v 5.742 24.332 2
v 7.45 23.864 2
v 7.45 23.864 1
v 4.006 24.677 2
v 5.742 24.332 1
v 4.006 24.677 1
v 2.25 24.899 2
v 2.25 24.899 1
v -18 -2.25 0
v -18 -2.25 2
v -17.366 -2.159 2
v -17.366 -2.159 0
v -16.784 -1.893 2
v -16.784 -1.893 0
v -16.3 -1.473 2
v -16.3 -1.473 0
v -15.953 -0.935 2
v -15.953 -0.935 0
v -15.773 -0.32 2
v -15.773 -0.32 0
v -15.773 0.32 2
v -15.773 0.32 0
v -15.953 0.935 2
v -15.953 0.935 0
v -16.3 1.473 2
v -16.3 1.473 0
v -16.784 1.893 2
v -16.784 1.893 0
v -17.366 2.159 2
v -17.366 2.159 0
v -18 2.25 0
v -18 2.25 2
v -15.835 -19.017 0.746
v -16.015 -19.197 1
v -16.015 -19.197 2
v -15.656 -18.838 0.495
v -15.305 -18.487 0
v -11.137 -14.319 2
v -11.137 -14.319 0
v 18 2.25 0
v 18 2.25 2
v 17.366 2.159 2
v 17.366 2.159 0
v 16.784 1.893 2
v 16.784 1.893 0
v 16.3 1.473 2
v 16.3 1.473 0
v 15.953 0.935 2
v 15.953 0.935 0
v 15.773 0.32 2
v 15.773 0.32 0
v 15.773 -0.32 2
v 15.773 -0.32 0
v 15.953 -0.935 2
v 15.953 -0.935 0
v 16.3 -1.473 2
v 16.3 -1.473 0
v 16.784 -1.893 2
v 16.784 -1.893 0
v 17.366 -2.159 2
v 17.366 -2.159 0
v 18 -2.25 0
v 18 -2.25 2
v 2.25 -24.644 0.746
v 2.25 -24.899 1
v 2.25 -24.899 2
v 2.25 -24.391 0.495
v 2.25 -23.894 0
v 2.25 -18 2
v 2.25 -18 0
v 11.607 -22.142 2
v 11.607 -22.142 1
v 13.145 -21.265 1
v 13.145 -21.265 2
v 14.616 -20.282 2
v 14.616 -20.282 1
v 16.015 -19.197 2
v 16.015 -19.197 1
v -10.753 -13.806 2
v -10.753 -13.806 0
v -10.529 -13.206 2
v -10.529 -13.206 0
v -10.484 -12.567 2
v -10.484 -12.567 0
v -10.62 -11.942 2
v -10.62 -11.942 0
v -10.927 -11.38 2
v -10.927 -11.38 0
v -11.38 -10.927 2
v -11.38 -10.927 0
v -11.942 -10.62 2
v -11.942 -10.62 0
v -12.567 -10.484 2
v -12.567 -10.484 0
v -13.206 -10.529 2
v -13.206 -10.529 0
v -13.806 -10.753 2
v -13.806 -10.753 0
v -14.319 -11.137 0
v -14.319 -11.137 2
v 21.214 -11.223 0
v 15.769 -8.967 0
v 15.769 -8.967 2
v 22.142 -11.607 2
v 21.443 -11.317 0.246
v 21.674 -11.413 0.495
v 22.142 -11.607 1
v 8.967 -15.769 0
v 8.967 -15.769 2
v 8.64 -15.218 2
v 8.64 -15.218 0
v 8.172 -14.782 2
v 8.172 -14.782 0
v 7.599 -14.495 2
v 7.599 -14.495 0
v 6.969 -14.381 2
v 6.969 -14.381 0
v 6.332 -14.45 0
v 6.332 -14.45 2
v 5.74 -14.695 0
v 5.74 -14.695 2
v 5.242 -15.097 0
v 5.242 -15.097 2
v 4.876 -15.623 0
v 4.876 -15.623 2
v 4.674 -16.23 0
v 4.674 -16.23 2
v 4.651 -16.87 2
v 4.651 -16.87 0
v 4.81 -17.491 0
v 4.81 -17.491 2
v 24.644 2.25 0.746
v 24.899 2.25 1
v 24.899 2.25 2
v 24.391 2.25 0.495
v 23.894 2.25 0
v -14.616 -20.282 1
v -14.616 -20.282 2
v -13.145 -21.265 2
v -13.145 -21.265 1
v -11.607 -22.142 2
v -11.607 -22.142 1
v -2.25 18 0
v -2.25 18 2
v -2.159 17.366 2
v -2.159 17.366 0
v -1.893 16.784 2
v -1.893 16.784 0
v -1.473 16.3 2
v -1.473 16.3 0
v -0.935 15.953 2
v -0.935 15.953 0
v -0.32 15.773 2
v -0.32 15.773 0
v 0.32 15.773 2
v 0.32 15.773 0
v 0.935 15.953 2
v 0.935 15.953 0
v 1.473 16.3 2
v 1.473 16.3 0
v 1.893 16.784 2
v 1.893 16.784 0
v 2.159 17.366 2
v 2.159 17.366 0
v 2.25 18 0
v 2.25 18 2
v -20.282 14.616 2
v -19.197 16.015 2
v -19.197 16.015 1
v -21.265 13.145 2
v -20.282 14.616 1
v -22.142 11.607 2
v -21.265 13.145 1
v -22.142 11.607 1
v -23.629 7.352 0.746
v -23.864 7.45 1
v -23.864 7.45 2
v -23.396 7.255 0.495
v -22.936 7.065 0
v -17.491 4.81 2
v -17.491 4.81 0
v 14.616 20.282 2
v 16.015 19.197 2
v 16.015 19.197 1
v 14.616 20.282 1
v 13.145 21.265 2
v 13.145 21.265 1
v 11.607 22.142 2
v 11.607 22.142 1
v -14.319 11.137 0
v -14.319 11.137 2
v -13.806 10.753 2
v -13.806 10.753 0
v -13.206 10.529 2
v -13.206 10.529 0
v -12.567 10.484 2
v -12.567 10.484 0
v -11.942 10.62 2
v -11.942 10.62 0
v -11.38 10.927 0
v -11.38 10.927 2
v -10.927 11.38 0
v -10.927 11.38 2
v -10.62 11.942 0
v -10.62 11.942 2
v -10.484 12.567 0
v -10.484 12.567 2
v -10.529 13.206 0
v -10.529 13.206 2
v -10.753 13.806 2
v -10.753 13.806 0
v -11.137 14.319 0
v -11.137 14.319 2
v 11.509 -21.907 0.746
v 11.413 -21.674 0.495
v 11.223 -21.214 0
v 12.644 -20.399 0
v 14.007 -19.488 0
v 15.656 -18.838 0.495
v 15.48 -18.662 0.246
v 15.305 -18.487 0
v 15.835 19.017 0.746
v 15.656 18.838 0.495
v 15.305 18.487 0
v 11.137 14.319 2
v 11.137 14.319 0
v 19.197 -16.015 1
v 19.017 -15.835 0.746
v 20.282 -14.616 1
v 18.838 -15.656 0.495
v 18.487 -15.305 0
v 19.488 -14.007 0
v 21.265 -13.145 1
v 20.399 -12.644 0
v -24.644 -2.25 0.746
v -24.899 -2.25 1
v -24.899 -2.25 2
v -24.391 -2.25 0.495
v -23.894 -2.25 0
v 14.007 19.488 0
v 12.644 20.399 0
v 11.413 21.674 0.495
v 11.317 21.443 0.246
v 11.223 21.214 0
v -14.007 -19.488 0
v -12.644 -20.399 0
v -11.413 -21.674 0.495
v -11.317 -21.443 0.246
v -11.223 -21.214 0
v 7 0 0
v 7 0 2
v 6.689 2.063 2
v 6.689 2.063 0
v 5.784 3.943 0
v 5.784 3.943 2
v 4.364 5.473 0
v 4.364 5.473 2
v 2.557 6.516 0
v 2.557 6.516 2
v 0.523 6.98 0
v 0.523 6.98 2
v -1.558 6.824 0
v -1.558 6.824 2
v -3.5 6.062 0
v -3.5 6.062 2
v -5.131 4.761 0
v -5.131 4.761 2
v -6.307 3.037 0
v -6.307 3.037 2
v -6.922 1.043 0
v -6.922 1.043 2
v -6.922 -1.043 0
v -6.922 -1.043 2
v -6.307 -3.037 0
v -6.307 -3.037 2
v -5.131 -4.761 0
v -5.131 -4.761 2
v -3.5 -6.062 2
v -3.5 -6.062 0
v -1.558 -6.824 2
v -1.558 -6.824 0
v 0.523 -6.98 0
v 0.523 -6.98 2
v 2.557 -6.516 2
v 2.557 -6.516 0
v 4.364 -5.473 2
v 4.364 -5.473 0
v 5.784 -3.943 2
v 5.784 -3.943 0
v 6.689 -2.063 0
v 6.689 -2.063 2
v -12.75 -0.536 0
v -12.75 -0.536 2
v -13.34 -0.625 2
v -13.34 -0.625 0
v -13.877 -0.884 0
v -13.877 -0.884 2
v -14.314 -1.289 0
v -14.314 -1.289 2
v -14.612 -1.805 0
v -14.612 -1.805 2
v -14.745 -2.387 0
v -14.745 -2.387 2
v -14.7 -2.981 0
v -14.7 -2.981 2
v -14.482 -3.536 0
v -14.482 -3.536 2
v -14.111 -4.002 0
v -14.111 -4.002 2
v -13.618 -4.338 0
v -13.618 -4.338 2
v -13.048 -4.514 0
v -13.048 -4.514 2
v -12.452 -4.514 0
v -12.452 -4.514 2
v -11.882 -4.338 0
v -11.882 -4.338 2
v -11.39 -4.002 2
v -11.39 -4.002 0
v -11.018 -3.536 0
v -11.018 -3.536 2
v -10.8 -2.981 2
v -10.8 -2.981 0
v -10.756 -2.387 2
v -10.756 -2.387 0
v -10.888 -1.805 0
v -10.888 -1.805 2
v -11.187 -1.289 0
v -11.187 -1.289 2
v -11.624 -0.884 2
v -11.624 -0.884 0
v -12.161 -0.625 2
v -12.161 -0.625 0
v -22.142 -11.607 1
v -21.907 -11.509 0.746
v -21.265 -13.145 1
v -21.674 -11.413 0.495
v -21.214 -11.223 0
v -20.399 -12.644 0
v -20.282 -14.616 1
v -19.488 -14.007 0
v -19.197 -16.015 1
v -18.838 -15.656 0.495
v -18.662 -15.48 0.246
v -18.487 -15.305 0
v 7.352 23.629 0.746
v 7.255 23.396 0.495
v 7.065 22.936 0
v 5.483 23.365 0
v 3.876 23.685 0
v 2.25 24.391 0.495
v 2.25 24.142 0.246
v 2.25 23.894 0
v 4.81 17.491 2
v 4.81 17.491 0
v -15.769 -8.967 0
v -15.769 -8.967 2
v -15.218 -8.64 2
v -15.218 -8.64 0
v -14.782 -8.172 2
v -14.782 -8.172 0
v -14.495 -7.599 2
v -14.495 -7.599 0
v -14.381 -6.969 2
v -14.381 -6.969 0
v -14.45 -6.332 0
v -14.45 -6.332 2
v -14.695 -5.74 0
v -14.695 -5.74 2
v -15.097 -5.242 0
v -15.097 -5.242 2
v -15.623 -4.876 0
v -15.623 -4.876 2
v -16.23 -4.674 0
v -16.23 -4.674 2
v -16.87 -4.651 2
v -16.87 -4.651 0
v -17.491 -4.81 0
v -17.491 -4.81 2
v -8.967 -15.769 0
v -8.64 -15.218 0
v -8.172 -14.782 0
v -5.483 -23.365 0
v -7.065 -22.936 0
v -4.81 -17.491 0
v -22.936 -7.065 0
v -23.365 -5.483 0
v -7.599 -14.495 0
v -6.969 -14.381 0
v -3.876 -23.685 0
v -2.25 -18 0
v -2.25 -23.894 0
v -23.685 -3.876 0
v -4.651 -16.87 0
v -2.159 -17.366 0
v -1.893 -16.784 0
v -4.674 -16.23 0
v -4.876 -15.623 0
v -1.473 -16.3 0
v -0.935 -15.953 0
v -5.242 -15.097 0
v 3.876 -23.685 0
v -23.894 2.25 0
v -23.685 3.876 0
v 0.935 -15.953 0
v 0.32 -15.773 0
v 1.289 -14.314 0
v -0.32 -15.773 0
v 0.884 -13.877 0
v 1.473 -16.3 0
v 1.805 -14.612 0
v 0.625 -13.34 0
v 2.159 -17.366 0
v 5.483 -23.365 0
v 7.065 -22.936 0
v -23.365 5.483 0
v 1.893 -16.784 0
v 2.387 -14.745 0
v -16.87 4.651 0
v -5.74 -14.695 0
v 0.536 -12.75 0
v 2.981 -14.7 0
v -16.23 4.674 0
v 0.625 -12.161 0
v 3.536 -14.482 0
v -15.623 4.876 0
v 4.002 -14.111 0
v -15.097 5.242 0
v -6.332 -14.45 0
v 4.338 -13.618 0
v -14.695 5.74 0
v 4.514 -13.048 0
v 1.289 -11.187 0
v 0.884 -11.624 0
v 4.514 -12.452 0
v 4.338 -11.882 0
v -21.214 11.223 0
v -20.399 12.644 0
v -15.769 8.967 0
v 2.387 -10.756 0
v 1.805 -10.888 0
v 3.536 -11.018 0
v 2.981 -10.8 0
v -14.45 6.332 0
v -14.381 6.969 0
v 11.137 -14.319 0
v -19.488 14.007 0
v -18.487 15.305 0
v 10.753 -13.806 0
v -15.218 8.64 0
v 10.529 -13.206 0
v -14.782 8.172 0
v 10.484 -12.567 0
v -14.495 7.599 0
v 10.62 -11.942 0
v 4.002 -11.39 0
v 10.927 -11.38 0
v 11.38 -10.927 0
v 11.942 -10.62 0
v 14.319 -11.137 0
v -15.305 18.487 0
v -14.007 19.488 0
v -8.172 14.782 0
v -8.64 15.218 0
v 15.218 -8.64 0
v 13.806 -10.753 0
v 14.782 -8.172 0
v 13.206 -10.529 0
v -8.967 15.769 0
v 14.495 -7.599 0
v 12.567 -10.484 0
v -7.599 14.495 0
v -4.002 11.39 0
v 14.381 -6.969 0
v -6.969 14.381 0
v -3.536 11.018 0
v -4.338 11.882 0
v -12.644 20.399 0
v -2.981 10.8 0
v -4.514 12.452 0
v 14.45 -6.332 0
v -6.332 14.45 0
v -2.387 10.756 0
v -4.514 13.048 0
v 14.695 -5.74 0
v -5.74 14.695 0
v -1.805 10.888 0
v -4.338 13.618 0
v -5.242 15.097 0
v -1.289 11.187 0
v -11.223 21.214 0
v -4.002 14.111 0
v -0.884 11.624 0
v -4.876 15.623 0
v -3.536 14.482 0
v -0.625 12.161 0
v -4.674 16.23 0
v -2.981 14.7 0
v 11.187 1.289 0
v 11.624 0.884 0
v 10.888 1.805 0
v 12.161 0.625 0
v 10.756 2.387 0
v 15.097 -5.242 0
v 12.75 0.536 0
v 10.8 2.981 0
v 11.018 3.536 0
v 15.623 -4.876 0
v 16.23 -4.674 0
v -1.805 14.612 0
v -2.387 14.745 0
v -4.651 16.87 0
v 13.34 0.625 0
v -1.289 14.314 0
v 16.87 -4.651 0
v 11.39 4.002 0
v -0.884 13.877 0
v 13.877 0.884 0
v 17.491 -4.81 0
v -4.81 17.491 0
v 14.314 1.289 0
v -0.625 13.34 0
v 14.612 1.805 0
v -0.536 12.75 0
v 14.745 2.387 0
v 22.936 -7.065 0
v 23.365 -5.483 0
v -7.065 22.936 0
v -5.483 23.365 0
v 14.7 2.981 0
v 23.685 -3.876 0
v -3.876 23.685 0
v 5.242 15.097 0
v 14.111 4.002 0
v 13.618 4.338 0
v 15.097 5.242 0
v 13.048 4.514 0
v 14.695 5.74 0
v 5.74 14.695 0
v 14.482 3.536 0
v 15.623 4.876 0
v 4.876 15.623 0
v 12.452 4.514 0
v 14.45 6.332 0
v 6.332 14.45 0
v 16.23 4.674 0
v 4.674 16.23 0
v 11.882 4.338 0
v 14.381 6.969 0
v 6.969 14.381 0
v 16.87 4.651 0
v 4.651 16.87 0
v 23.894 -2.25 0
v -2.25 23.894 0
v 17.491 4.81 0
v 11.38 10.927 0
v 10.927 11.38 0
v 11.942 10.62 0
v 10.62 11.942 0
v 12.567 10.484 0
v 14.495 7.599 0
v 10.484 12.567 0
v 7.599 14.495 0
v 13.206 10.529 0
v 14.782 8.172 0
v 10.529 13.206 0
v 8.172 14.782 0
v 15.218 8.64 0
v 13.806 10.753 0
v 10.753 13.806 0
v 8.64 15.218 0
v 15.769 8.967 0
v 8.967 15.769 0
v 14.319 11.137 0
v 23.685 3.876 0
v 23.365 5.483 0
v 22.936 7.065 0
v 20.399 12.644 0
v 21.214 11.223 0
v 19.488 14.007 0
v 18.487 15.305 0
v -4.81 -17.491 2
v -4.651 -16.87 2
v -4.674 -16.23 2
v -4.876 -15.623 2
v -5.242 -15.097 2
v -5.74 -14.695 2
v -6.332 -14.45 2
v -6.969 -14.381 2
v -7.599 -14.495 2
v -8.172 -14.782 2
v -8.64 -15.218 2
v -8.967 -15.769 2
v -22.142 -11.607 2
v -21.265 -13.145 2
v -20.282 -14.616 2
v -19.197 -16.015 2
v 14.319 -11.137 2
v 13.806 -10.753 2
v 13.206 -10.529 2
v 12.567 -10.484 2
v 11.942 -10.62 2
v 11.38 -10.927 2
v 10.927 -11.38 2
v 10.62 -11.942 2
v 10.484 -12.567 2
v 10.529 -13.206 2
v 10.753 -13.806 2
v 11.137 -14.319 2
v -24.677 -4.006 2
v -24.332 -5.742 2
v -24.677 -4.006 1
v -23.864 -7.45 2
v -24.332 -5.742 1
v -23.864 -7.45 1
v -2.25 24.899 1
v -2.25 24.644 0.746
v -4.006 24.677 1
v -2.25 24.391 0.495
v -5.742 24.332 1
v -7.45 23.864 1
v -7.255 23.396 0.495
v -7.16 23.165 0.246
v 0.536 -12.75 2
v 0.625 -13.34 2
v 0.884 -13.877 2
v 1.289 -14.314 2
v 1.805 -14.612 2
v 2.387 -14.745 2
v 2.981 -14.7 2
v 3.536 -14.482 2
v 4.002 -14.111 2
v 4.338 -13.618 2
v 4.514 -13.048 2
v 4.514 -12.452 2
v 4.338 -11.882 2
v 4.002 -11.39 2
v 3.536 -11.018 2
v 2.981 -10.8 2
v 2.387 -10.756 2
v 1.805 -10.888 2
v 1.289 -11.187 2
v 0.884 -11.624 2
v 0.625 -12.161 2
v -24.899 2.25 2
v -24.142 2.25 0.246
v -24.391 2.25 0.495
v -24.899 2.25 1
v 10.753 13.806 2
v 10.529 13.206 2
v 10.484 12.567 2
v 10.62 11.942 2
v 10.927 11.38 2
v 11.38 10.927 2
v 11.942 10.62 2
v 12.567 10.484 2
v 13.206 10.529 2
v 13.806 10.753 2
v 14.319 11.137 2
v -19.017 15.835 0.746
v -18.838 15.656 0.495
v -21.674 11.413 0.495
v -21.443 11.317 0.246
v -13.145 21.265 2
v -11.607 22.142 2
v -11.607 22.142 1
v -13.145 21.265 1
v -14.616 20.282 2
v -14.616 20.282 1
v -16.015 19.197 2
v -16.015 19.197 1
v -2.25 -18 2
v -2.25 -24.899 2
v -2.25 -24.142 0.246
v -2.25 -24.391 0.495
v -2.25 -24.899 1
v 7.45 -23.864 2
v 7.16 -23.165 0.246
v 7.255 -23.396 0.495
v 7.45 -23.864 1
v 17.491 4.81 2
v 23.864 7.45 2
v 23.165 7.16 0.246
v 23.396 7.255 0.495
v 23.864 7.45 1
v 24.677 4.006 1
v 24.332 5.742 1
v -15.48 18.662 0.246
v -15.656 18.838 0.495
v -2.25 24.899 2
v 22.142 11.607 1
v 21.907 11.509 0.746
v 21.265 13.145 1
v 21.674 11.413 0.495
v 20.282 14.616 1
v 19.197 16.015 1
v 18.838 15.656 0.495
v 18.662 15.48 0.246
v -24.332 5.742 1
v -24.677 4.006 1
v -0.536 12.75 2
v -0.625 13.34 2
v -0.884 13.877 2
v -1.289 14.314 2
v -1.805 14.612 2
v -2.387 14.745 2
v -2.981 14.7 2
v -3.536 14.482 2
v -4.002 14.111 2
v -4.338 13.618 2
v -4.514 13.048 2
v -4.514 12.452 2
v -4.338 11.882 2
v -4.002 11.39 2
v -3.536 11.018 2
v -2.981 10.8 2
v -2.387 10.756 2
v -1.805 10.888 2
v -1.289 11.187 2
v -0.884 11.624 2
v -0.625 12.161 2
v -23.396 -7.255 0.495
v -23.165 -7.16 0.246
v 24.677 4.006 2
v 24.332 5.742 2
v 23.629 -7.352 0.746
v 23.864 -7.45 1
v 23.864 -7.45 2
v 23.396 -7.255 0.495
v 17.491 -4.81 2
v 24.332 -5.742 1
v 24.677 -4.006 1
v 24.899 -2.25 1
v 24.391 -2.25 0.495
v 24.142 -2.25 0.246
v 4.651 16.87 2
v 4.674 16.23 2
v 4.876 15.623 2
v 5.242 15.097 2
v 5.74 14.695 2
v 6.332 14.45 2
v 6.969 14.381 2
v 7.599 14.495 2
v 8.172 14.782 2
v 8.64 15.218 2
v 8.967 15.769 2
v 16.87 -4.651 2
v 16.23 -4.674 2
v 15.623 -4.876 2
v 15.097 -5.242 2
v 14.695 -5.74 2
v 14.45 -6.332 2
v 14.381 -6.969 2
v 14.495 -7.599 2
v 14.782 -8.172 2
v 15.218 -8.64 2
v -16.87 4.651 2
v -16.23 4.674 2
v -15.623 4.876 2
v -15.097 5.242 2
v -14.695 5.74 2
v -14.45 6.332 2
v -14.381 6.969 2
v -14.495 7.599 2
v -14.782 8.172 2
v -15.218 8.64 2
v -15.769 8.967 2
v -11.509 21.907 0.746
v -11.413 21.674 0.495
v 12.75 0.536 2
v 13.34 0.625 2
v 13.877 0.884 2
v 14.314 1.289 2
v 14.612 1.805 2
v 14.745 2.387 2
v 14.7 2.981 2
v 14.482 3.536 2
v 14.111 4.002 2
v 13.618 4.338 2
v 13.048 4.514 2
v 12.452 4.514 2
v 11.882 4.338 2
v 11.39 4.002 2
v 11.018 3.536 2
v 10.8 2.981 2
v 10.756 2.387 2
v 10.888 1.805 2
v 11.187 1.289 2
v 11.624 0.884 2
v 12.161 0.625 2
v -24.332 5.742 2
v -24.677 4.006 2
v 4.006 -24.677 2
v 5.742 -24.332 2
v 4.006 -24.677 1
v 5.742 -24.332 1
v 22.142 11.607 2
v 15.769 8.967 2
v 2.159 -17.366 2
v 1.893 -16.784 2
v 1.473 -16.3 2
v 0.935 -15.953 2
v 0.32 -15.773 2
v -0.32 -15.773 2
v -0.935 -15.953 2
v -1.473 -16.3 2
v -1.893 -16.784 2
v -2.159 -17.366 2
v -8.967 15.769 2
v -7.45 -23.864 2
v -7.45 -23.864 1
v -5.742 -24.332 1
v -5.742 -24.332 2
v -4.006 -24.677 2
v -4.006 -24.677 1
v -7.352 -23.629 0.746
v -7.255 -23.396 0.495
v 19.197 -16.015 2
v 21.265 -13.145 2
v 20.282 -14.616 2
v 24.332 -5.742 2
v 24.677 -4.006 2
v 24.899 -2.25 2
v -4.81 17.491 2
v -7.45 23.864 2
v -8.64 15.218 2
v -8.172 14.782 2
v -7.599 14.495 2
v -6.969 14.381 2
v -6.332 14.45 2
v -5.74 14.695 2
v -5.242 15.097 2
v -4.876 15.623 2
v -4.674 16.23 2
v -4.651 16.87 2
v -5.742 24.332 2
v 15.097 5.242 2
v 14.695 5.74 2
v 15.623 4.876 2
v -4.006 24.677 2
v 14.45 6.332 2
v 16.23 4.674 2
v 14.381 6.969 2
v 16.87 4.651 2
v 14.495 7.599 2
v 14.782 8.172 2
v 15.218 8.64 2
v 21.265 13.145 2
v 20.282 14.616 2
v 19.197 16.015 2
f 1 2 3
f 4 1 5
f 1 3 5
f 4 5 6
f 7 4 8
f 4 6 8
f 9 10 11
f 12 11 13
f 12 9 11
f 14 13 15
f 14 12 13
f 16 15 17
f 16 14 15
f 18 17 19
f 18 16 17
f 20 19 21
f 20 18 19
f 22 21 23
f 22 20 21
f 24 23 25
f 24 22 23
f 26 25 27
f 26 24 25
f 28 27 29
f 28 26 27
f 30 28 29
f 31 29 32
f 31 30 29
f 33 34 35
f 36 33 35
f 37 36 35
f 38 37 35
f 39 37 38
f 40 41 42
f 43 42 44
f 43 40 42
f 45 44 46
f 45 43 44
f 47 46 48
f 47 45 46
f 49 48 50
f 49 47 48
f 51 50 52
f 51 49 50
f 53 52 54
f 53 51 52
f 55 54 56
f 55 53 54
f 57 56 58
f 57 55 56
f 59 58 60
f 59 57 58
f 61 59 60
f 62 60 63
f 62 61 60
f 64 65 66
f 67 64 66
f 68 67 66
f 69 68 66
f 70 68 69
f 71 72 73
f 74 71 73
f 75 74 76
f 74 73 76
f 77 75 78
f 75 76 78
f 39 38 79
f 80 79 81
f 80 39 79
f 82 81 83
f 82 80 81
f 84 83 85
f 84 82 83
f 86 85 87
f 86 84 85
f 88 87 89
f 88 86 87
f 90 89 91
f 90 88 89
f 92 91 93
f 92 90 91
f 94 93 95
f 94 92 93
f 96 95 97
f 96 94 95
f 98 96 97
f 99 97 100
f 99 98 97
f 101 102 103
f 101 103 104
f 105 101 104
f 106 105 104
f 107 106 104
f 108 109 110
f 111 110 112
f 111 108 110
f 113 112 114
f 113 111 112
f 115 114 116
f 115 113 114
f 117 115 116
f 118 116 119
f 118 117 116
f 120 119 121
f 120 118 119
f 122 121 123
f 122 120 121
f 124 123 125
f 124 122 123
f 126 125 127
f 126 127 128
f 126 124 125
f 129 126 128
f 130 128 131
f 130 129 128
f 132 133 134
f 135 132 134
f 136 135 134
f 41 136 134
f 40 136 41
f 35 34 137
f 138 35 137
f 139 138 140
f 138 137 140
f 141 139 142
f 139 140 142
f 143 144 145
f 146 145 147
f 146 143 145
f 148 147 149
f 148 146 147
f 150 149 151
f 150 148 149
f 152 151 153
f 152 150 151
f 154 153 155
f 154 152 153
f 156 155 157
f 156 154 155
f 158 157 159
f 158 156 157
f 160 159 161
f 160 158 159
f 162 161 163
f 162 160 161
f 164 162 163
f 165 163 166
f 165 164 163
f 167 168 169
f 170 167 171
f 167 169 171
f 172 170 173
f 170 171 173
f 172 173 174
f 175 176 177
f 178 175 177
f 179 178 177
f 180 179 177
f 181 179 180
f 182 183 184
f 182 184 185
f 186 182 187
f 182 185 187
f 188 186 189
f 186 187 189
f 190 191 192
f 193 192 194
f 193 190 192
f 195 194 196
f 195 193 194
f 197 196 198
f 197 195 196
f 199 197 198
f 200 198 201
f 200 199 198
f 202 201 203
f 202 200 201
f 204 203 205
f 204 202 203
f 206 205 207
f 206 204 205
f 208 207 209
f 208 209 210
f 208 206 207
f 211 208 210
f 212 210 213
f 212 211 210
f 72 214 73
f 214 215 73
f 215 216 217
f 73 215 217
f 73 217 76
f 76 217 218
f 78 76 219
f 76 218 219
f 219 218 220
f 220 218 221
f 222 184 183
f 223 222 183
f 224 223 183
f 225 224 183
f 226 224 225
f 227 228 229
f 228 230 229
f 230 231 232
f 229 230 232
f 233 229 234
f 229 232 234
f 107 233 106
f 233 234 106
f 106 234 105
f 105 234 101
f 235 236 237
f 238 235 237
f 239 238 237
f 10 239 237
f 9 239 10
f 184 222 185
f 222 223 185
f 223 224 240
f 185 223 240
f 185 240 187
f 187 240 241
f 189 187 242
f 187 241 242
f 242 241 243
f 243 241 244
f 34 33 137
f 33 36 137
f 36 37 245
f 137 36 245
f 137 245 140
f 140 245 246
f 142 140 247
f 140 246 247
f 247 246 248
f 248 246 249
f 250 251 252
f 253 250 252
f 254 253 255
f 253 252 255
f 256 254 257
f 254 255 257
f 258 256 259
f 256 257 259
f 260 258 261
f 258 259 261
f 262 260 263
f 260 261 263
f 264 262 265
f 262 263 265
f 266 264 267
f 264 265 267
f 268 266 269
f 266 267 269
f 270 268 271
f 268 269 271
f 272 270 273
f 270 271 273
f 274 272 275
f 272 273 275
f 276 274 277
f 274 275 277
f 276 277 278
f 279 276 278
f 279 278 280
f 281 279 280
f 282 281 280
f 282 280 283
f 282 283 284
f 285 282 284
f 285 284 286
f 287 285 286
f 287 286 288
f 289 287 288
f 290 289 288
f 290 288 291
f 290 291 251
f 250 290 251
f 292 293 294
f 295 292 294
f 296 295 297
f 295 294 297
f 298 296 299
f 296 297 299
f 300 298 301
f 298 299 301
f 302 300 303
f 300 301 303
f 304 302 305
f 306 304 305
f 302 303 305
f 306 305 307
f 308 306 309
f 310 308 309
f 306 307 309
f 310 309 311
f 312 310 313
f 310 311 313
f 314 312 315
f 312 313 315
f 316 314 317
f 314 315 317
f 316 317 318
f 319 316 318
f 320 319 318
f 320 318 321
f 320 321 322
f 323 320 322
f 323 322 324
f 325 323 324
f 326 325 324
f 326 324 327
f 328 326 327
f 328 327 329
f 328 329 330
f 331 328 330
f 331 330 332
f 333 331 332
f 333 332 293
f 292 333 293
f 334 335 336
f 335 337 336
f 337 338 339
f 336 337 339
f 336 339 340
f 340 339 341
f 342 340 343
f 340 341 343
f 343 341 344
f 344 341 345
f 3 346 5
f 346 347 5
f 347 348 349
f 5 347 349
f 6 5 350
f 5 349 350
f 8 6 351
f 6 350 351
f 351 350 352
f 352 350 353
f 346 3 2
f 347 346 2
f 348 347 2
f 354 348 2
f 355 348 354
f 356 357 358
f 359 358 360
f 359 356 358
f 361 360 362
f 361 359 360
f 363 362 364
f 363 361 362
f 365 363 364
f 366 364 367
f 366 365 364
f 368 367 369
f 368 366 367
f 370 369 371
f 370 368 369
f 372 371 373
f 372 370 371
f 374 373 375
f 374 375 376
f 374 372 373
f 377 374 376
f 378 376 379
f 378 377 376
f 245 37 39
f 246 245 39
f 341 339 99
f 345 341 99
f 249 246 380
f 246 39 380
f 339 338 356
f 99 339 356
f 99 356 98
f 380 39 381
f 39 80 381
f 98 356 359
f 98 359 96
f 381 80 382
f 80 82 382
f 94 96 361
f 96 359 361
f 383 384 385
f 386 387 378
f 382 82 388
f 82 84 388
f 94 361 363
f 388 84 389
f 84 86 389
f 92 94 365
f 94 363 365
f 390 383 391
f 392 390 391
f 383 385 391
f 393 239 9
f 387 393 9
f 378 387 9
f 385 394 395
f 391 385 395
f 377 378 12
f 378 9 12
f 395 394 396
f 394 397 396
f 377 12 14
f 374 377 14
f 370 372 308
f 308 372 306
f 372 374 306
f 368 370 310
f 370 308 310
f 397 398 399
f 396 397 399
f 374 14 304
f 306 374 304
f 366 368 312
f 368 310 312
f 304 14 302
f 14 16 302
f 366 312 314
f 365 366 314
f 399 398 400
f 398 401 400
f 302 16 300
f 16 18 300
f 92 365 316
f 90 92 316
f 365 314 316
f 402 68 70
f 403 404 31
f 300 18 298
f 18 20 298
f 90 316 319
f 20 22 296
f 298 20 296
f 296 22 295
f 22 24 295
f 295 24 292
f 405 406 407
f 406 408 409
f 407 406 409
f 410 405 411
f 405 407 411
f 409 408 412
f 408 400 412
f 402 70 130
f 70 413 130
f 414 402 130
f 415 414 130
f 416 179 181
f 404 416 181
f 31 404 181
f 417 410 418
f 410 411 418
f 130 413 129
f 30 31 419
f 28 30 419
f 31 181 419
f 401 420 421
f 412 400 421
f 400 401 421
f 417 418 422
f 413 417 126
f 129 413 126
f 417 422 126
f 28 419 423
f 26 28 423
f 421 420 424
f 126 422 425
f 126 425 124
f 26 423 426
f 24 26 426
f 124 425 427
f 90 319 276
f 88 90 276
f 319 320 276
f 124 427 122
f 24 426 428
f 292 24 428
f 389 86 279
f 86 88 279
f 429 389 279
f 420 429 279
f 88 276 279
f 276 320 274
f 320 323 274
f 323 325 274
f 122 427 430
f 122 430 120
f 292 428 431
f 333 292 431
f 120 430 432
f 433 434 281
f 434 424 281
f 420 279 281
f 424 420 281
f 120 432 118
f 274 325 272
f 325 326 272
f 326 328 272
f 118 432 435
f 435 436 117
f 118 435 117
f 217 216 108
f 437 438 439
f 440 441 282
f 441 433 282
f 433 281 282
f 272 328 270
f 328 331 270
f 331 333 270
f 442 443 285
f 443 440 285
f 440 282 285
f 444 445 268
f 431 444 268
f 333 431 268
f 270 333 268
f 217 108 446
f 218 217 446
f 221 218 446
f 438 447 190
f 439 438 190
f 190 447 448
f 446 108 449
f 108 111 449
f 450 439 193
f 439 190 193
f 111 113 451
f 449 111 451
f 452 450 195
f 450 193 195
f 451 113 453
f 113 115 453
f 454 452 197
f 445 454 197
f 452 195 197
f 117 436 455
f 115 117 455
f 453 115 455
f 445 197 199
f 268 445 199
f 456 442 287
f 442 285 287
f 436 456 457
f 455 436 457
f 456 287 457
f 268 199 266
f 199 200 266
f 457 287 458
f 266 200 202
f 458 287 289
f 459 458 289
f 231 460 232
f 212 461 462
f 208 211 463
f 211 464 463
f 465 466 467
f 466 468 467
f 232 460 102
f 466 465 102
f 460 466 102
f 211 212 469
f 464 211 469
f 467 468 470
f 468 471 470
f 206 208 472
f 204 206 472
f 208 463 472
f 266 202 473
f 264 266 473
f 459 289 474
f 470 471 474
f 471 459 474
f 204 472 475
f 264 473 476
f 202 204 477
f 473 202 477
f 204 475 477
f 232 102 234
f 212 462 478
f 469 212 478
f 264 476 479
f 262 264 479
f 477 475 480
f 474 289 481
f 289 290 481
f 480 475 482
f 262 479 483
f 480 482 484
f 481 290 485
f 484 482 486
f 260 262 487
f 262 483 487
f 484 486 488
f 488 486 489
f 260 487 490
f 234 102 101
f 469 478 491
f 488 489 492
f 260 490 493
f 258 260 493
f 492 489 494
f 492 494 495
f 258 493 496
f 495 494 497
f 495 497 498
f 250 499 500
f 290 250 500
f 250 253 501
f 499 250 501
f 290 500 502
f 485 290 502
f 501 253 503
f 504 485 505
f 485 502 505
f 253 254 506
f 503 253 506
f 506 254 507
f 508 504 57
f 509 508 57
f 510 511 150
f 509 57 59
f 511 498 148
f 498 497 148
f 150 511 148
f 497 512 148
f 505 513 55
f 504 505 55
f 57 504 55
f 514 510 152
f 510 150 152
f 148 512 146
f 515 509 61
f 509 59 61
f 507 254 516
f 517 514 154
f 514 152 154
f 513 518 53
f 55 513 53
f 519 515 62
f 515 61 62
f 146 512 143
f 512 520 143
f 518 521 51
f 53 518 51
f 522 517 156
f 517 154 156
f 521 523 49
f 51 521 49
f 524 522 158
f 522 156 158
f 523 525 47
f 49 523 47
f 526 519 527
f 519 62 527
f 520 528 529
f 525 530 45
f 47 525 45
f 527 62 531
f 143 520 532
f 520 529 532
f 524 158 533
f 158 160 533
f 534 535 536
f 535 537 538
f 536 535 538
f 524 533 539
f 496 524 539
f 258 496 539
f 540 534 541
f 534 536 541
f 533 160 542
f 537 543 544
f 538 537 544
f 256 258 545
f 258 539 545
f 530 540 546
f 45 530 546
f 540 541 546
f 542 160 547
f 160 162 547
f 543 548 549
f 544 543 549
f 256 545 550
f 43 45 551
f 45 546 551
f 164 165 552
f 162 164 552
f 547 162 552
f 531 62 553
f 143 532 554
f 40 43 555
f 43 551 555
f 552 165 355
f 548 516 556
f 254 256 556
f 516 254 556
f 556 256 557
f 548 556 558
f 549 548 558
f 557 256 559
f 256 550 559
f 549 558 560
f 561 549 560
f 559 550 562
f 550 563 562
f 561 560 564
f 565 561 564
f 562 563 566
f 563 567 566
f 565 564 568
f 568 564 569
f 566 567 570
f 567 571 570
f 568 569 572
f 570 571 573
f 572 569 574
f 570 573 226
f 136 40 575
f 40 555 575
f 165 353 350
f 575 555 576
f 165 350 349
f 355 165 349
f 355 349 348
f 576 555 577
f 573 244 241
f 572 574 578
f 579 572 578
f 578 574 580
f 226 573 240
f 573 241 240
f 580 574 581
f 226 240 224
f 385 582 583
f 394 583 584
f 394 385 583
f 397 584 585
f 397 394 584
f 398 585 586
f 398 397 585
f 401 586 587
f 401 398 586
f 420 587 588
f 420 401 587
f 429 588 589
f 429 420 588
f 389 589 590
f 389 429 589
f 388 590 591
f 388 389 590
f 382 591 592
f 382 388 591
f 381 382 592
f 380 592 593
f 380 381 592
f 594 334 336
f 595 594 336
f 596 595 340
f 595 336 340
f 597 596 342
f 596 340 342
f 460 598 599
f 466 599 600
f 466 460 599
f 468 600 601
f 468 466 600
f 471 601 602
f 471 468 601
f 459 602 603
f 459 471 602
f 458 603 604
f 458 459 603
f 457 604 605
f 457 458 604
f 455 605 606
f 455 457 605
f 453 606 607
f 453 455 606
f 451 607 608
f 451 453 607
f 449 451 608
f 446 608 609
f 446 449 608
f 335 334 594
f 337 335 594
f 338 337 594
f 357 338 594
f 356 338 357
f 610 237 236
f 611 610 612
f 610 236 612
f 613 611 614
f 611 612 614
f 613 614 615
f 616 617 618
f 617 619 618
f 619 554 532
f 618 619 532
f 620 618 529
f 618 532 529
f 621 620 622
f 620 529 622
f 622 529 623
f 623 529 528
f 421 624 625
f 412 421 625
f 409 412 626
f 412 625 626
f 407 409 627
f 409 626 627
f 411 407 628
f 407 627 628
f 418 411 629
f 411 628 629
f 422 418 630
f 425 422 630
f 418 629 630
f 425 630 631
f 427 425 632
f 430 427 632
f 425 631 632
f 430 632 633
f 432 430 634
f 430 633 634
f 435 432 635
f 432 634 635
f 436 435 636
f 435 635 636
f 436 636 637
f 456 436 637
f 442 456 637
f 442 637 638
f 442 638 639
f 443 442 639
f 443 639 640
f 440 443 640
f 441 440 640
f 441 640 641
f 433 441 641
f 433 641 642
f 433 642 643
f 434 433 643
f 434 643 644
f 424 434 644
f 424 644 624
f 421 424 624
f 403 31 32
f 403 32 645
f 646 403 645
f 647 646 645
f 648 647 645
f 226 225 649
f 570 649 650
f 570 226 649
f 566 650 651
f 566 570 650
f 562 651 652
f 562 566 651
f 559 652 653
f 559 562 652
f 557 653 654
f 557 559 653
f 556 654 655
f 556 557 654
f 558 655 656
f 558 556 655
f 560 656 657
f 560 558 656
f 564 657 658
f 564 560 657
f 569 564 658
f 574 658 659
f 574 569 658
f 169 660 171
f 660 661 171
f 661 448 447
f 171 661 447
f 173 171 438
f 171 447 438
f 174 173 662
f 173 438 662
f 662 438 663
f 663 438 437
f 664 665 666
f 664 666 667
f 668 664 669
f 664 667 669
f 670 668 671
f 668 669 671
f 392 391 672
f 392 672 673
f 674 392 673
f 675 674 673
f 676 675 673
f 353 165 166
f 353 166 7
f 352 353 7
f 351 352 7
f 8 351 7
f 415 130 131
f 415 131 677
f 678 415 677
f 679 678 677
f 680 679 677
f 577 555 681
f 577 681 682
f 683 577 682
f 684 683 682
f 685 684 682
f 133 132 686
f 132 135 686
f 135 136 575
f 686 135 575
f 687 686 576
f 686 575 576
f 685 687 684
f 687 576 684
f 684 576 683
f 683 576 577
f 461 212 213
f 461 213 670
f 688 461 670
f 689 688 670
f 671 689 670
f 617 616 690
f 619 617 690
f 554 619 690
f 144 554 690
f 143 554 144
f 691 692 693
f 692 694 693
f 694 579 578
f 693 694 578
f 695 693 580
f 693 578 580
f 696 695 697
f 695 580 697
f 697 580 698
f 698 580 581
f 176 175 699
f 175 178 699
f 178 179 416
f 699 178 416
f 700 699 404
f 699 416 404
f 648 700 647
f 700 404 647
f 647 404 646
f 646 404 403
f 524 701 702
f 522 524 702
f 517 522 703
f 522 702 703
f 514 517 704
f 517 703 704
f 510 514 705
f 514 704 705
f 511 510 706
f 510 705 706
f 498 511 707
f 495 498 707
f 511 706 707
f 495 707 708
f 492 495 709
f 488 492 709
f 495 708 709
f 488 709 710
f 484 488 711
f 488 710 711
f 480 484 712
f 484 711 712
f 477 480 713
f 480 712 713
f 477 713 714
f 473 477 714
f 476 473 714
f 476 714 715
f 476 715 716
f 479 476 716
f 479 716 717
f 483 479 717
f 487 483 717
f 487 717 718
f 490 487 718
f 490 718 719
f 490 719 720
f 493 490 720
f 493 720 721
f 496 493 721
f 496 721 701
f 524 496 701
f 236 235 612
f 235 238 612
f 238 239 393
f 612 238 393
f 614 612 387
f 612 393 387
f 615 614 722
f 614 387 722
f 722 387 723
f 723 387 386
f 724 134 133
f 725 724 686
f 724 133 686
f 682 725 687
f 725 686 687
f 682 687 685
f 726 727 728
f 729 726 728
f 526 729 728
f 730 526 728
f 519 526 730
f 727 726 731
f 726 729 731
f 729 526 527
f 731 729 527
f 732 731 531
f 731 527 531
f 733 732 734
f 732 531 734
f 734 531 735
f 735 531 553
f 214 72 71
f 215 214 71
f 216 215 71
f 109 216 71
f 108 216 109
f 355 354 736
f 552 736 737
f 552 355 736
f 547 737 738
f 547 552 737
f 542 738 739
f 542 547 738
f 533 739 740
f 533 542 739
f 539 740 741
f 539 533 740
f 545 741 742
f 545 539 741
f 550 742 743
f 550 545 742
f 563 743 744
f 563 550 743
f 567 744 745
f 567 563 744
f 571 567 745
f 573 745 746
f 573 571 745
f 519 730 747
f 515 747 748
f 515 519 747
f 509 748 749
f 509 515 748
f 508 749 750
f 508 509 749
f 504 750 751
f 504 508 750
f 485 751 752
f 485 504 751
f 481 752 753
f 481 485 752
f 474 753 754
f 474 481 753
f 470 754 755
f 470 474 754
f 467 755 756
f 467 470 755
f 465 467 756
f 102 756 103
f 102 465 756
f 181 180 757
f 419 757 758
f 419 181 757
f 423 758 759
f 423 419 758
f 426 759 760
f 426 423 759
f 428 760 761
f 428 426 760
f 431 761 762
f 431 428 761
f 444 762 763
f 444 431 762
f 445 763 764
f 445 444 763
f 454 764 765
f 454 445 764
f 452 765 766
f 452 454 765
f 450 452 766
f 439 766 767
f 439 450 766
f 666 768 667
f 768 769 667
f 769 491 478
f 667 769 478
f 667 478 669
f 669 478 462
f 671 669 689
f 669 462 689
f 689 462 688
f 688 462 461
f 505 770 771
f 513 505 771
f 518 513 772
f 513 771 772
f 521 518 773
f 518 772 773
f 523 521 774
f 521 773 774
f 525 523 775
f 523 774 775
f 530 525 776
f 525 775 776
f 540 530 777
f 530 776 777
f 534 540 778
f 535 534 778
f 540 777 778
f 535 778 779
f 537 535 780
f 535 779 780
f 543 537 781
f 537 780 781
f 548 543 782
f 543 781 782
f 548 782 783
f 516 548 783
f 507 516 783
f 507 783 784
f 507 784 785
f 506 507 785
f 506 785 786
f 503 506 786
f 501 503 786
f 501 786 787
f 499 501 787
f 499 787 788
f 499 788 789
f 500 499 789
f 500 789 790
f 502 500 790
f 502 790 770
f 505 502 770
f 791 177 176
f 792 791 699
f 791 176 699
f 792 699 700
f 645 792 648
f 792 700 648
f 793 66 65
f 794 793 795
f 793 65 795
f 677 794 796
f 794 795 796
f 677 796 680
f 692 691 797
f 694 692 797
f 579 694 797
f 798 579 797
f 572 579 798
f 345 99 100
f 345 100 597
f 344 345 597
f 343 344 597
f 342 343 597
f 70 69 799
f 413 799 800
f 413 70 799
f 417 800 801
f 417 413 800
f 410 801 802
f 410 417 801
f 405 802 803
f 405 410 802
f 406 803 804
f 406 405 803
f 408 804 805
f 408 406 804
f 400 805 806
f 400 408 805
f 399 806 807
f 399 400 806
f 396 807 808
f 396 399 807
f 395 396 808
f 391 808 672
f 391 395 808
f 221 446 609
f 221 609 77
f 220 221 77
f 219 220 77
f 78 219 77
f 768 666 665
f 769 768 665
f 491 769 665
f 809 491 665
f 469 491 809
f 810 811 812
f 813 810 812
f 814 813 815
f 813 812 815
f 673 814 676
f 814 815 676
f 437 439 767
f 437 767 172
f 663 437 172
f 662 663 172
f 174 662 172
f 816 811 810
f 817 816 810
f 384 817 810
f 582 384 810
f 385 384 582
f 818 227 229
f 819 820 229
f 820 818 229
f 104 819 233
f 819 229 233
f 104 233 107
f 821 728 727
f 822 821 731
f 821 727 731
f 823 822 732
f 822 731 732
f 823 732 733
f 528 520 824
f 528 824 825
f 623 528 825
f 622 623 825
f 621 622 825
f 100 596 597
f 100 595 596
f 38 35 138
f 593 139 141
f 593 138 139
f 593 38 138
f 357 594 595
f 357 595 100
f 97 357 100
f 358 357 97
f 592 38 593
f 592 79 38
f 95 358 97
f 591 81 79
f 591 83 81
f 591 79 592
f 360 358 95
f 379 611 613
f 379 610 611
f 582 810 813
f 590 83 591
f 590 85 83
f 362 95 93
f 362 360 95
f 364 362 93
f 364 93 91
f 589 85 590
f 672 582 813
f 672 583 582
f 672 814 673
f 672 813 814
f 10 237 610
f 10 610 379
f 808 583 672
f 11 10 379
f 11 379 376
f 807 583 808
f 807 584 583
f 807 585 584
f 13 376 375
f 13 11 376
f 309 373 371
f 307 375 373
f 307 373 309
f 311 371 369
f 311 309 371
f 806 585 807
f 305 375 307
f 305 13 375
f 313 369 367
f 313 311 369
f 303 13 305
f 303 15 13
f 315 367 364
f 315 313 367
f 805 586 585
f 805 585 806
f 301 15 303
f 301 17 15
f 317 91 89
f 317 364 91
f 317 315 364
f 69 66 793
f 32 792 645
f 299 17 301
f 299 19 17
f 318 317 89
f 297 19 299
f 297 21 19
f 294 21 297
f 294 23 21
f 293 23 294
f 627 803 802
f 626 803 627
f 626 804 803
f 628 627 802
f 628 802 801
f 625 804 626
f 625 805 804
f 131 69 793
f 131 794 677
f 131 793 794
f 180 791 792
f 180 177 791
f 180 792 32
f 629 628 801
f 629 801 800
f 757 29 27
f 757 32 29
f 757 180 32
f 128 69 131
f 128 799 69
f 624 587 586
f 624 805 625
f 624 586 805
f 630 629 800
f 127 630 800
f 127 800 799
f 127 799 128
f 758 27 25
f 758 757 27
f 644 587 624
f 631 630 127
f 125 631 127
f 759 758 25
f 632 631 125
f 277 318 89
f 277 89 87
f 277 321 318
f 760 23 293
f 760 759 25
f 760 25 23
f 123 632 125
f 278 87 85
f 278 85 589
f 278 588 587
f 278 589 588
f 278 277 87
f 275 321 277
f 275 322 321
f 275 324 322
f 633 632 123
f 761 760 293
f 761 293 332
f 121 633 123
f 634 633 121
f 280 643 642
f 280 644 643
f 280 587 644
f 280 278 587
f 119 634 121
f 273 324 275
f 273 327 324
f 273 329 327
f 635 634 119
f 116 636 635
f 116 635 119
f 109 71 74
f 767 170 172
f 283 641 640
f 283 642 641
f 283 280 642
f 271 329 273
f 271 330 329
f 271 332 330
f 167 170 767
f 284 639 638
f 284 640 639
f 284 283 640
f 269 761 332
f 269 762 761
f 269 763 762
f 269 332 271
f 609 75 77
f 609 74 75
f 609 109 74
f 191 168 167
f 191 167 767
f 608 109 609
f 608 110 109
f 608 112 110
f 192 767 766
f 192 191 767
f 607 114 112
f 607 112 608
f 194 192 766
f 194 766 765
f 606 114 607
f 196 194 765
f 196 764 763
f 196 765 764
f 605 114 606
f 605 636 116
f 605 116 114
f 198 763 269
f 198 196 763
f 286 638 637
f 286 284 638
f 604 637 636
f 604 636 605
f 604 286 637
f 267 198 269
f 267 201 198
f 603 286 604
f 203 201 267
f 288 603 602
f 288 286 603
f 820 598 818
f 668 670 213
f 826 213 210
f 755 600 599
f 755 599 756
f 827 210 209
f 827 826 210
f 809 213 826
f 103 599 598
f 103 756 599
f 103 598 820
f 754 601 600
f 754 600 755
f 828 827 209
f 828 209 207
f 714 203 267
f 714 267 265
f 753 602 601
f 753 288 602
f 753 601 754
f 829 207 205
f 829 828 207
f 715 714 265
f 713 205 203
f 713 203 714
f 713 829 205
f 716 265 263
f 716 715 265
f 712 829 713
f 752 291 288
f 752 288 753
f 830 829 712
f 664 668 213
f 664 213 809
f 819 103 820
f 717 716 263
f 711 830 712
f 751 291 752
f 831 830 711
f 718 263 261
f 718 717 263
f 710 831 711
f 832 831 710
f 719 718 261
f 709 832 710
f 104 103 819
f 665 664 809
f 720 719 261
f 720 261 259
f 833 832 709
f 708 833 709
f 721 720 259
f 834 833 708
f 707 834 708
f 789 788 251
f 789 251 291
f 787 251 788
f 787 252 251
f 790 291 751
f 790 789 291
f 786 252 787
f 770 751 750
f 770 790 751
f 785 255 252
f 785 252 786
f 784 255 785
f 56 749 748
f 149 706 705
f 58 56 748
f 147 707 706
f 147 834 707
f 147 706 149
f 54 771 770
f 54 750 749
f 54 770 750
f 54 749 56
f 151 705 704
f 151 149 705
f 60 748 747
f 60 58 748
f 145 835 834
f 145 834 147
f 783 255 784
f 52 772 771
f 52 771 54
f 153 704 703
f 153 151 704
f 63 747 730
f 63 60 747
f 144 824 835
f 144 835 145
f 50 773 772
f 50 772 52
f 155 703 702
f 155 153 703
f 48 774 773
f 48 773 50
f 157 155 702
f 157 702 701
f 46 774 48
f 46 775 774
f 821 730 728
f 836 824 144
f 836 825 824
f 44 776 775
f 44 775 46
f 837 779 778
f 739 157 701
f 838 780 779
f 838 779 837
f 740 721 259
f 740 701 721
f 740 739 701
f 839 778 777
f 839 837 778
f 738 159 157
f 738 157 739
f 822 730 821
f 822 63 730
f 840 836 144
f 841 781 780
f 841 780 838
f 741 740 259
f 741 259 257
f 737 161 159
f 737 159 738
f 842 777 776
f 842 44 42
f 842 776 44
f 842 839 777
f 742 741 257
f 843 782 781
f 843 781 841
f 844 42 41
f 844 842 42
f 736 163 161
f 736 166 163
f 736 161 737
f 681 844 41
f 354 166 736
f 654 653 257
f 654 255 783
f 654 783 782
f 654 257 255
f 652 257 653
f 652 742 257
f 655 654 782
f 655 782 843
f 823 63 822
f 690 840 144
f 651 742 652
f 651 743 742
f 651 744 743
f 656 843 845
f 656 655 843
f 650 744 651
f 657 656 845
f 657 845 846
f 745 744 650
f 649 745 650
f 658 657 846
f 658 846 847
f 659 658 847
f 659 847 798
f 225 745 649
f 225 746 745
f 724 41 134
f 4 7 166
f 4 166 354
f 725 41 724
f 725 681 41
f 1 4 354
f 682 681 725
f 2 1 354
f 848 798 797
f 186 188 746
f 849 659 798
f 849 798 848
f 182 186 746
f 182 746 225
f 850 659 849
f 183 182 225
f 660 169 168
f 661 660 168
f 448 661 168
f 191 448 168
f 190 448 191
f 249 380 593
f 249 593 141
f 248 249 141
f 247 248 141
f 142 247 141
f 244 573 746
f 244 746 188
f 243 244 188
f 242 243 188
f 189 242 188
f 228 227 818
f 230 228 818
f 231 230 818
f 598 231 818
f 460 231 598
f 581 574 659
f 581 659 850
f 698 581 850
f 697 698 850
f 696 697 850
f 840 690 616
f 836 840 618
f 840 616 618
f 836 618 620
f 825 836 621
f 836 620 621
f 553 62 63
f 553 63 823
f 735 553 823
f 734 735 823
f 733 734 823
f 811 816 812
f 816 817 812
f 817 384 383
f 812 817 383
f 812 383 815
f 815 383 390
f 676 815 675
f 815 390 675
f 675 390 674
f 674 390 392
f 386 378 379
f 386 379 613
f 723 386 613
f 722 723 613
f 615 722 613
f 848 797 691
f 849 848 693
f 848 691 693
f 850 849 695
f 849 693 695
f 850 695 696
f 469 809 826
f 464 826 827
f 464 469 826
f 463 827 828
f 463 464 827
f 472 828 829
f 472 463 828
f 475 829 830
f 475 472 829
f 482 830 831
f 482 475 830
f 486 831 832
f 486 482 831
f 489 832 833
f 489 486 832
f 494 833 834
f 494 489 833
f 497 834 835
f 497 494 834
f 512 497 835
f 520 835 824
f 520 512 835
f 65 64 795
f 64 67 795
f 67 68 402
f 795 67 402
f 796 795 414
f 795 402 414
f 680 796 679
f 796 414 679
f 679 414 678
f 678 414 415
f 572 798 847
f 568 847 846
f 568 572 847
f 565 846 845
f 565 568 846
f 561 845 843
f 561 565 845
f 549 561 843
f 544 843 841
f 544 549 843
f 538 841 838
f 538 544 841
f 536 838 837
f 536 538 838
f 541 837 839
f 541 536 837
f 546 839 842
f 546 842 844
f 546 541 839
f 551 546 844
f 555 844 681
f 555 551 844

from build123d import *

# Parameters (mm, degrees)
SKETCH_1_R               = 25
EXTRUDE_1_DEPTH          = 2
SKETCH_2_R               = 7
CUT_EXTRUDE_2_DEPTH      = 3
SKETCH_3_R               = 2
CUT_EXTRUDE_3_DEPTH      = 3
PATTERN_CIRCULAR_1_COUNT = 4
CHAMFER_1_SIZE           = 1
CUT_EXTRUDE_START        = -3
CUT_EXTRUDE_4_DEPTH      = 3
PATTERN_CIRCULAR_3_COUNT = 16


with BuildPart() as part:
    # 草图1 → 拉伸1 (new body)
    with BuildSketch(Plane.XY):
        Circle(SKETCH_1_R)
    extrude(amount=EXTRUDE_1_DEPTH)

    # 草图2 → 拉伸2 (cut)
    with BuildSketch(Plane.XY.offset(2)):
        Circle(SKETCH_2_R)
    extrude(amount=-CUT_EXTRUDE_2_DEPTH, mode=Mode.SUBTRACT)

    # 草图3 → 拉伸3 (cut)
    with BuildSketch(Plane.XY.offset(2)):
        with Locations((-2.536174186, 12.750208645)):
            Circle(SKETCH_3_R)
    cut_extrude_3 = extrude(amount=-CUT_EXTRUDE_3_DEPTH, mode=Mode.SUBTRACT)

    # 阵列(圆周)1: 拉伸3 ×4 about axis
    pattern_circular_1_axis = Axis((0, 0, 0), (0, 0, 1))
    for i in range(1, PATTERN_CIRCULAR_1_COUNT):
        add(cut_extrude_3.rotate(pattern_circular_1_axis, i * 360 / PATTERN_CIRCULAR_1_COUNT), mode=Mode.SUBTRACT)

    # 倒角1
    chamfer_1_edges = [part.edges().sort_by_distance(p)[0] for p in [
        (-25, 0, 0),
    ]]
    chamfer(chamfer_1_edges, length=CHAMFER_1_SIZE)

    # 草图4 → 拉伸4 (cut)
    with BuildSketch(Plane.XY.offset(2).offset(CUT_EXTRUDE_START)):
        with BuildLine():
            Line((-18, 2.25), (-24.898544134, 2.25))
            ThreePointArc((-24.898544134, 2.25), (-25, 0), (-24.898544134, -2.25))
            Line((-24.898544134, -2.25), (-18, -2.25))
            ThreePointArc((-18, -2.25), (-15.75, 0), (-18, 2.25))
        make_face()
    cut_extrude_4 = extrude(amount=CUT_EXTRUDE_4_DEPTH, mode=Mode.SUBTRACT)

    # 阵列(圆周)3: 拉伸4 ×16 about axis
    pattern_circular_3_axis = Axis((0, 0, 0), (0, 0, 1))
    for i in range(1, PATTERN_CIRCULAR_3_COUNT):
        add(cut_extrude_4.rotate(pattern_circular_3_axis, i * 360 / PATTERN_CIRCULAR_3_COUNT), mode=Mode.SUBTRACT)


solid = part.part
